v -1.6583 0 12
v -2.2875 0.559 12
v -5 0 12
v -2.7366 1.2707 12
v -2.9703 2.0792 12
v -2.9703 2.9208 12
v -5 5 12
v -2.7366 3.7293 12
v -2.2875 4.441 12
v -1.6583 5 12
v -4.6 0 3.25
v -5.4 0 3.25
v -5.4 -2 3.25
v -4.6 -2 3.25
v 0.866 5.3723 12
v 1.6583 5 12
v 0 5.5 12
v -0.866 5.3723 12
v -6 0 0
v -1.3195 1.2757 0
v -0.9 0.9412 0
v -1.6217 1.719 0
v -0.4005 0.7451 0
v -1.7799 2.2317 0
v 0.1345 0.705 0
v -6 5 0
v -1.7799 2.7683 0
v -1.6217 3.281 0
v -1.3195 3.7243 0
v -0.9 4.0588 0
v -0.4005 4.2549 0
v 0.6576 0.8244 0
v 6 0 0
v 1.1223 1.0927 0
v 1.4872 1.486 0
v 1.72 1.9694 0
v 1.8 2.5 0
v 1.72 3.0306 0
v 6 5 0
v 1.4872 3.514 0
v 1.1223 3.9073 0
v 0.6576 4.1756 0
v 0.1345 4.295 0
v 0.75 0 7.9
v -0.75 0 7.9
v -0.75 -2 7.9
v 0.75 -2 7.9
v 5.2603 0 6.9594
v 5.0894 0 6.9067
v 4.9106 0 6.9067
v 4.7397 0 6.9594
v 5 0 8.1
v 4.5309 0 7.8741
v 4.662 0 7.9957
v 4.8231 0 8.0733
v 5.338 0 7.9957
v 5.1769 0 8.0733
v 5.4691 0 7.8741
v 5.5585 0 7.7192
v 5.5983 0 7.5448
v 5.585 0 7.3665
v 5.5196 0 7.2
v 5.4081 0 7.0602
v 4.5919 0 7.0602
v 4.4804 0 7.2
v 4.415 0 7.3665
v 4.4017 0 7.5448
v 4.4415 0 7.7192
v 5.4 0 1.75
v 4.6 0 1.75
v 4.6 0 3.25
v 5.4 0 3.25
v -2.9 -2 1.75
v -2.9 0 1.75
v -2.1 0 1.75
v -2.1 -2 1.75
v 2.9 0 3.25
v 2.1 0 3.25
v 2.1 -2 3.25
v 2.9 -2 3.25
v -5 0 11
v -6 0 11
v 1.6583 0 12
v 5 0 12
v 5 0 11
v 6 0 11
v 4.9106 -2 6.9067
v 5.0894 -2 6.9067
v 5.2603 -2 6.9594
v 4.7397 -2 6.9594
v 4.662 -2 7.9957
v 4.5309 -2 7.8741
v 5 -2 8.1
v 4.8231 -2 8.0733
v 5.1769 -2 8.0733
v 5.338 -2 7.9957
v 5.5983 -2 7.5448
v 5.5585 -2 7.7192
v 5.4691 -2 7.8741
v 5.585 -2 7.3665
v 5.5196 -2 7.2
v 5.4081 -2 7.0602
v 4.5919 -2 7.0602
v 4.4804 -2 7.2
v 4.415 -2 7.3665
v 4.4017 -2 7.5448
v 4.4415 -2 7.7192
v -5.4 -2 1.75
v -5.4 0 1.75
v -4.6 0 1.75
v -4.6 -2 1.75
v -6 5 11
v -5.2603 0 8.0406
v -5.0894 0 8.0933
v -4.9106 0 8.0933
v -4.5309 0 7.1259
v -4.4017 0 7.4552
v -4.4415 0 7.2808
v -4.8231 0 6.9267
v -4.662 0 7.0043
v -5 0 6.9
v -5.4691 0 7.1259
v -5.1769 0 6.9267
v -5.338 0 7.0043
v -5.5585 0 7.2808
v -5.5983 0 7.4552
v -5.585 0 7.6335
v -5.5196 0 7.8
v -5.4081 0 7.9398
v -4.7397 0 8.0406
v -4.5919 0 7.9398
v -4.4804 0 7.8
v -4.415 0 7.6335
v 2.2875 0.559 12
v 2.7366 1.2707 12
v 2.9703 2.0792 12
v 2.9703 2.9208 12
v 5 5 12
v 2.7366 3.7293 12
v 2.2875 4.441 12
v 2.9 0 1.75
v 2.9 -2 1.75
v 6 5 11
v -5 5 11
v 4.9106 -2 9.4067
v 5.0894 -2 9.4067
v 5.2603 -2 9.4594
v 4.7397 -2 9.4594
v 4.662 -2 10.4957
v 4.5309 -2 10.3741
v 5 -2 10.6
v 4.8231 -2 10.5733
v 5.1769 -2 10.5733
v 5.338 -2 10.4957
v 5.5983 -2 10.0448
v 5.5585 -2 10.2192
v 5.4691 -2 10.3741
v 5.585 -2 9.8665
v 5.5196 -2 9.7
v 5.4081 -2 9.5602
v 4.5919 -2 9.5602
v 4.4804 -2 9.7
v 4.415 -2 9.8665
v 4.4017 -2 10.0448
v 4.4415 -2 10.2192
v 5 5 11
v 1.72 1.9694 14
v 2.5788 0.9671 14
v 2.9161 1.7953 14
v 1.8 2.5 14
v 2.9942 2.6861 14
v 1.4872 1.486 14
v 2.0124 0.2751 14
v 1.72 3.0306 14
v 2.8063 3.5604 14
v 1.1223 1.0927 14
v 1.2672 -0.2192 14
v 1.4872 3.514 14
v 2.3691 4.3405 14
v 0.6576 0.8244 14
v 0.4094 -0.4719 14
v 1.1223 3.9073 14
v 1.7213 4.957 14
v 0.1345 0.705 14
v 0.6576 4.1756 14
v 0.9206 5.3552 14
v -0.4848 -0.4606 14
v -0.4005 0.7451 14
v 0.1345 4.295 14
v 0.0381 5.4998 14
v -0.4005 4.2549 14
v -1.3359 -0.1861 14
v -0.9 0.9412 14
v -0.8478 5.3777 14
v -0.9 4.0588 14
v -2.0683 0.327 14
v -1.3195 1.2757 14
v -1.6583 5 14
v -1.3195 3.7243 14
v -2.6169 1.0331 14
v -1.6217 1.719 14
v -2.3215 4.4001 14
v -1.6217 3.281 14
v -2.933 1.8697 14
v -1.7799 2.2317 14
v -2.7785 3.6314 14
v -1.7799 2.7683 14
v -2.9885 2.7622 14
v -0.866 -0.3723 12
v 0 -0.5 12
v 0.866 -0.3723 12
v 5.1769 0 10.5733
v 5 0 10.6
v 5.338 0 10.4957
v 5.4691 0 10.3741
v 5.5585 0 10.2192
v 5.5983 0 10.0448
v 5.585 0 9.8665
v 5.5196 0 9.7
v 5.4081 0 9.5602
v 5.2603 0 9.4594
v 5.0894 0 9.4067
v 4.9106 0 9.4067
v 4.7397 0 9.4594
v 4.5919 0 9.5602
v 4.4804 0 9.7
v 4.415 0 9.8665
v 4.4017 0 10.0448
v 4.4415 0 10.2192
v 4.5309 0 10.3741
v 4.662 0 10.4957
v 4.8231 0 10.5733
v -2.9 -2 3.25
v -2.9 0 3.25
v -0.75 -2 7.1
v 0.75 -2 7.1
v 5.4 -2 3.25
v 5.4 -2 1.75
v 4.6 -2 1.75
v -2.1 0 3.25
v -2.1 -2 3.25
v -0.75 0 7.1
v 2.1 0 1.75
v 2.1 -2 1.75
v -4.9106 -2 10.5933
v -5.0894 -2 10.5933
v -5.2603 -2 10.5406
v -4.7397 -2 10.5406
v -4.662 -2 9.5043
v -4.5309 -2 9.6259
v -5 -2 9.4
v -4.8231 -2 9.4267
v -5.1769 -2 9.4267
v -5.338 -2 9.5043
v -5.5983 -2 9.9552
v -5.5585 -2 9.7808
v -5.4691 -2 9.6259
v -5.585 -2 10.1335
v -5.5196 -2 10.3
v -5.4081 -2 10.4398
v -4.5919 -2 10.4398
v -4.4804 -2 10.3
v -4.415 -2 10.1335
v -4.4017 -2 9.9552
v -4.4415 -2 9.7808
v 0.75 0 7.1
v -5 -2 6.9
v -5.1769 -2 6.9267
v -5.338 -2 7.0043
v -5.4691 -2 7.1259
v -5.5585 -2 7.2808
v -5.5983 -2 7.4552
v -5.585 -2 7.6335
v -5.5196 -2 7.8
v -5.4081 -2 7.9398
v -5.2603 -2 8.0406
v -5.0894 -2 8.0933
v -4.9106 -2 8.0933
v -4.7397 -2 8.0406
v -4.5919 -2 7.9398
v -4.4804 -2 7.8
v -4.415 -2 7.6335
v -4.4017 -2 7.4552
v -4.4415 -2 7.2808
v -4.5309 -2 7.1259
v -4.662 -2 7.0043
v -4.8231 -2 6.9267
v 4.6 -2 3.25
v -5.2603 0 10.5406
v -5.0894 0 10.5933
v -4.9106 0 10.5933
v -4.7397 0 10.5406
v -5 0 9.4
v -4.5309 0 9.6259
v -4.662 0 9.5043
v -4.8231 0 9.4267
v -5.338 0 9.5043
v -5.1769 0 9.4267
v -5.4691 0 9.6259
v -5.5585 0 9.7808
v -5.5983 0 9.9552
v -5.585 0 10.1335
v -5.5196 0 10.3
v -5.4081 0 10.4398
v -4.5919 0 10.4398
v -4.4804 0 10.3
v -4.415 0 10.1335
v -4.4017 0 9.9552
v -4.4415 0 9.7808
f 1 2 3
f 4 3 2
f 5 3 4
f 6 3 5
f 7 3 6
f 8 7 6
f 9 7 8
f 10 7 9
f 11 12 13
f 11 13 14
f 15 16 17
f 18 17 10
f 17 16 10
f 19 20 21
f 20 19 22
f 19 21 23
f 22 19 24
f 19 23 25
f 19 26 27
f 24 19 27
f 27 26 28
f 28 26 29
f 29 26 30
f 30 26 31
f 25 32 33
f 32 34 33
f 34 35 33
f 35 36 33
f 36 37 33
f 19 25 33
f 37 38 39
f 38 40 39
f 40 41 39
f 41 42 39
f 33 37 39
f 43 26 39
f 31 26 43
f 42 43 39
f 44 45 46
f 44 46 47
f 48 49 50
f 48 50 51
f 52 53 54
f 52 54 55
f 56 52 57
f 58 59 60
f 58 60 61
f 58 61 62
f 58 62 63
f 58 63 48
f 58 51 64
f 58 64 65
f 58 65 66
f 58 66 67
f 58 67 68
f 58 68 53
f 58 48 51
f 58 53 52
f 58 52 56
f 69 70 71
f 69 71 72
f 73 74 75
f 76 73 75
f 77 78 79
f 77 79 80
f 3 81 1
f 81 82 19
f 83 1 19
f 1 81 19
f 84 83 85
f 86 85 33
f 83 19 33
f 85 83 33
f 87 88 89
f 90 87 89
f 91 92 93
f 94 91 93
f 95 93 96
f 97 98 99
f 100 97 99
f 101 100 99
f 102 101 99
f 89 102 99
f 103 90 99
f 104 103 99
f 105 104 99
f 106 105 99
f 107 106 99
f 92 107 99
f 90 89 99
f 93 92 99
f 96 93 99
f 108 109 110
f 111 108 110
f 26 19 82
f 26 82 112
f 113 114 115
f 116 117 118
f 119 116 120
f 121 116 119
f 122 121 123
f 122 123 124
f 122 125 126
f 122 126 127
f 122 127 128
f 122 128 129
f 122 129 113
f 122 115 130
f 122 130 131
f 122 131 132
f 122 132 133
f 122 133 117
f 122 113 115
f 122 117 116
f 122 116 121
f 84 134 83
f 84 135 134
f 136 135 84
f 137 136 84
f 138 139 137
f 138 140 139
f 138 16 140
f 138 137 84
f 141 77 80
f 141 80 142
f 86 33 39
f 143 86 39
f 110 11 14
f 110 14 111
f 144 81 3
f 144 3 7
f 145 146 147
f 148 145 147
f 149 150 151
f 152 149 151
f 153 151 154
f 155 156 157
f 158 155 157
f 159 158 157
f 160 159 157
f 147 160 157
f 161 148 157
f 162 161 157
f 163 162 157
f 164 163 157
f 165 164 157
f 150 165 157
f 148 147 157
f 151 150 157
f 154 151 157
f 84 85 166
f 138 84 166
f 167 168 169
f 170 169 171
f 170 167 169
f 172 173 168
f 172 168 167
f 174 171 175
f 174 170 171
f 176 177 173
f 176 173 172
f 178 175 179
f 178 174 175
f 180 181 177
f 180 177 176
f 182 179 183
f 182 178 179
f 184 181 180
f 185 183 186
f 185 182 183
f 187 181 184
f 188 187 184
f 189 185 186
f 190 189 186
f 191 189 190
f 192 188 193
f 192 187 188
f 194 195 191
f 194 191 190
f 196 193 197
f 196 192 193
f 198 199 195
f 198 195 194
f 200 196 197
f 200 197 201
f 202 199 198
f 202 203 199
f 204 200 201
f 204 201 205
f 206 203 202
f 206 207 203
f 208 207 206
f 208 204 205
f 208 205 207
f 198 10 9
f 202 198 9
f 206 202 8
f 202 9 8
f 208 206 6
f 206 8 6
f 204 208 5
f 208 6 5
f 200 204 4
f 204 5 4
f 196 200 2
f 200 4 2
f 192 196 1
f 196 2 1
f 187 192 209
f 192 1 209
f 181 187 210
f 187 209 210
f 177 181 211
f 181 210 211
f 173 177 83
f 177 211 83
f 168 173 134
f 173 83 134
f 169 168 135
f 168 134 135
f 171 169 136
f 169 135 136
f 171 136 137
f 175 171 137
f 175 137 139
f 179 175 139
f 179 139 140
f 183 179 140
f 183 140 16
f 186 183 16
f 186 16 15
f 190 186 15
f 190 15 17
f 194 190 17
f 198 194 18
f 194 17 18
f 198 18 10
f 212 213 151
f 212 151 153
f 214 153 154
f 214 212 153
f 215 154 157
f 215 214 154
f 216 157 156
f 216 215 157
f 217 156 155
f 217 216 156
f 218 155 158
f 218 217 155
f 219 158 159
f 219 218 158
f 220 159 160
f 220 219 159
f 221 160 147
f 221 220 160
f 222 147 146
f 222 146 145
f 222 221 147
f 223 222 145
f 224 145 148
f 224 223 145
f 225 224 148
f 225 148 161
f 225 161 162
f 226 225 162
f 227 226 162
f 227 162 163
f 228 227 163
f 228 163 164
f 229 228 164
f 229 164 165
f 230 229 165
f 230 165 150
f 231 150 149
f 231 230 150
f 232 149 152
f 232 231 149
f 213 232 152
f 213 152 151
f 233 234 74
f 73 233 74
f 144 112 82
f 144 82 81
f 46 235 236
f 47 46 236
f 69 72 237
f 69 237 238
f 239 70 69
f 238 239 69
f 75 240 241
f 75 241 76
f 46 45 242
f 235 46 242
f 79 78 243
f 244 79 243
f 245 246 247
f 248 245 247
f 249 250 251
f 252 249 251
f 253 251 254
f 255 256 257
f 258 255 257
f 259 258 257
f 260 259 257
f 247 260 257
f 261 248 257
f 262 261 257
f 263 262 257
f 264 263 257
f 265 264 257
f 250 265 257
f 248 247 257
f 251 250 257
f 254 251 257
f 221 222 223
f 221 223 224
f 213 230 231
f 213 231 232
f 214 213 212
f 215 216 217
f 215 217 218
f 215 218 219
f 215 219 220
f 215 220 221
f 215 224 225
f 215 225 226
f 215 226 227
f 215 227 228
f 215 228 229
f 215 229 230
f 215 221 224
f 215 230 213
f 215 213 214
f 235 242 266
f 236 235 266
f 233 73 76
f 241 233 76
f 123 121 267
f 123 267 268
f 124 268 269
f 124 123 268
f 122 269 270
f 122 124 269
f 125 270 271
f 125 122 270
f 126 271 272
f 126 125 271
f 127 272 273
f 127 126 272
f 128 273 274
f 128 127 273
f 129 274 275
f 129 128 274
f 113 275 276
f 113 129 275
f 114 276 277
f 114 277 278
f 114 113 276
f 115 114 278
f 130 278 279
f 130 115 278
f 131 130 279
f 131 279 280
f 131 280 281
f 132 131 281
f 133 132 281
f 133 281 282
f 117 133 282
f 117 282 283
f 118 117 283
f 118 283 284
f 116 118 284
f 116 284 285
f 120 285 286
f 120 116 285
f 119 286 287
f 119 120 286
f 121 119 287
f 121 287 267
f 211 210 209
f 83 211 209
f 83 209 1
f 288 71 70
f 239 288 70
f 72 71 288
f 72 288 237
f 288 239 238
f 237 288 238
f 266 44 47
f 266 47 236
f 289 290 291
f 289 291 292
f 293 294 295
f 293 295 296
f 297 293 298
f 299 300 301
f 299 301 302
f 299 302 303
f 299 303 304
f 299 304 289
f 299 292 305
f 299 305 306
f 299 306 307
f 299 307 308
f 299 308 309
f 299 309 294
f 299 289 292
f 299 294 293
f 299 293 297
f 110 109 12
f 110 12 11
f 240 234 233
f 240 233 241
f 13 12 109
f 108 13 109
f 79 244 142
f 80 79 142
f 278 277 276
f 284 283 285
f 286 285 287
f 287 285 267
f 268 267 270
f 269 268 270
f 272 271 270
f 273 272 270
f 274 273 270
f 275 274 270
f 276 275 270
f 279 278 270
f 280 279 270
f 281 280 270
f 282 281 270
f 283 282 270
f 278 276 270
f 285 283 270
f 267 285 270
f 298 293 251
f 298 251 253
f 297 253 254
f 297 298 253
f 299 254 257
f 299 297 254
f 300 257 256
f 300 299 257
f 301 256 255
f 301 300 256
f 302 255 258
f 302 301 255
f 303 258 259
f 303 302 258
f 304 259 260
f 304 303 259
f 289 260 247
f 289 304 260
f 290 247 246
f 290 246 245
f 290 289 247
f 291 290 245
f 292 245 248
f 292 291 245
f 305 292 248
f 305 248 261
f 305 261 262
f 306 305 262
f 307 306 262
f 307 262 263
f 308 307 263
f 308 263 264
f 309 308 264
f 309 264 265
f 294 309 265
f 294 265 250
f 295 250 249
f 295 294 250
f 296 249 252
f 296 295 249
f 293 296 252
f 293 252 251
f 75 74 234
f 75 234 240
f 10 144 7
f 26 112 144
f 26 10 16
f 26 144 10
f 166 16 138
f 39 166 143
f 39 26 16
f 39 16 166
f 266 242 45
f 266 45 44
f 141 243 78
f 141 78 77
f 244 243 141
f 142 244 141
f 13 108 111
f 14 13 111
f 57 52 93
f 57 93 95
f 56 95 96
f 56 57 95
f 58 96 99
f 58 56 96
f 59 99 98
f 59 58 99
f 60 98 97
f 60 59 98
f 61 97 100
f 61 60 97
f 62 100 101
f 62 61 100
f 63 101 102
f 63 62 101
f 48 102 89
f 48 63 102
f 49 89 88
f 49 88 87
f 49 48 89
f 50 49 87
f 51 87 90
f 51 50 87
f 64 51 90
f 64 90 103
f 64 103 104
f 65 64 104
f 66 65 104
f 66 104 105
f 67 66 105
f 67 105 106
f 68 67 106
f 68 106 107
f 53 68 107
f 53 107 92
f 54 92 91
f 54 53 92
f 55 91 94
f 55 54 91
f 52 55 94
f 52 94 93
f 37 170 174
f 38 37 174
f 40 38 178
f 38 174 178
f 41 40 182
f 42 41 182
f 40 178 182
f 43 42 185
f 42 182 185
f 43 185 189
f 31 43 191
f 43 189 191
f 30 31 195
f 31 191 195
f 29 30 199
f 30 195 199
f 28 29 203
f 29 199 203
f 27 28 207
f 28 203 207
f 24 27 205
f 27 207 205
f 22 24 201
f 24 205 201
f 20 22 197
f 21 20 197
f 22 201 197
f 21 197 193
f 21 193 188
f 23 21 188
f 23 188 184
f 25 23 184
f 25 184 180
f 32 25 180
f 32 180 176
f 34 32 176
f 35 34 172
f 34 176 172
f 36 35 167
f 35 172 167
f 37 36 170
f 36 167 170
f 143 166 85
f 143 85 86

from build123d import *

# Parameters (mm, degrees)
SKETCH_1_W          = 12
SKETCH_1_H          = 5
EXTRUDE_1_DEPTH     = 11
SKETCH_2_R          = 0.6
EXTRUDE_2_DEPTH     = 2
EXTRUDE_2_2_DEPTH   = 2
EXTRUDE_2_3_DEPTH   = 2
EXTRUDE_2_4_DEPTH   = 2
SKETCH_2_W          = 0.8
SKETCH_2_H          = 1.5
EXTRUDE_2_5_DEPTH   = 2
EXTRUDE_2_6_DEPTH   = 2
SKETCH_2_W_2        = 1.5
SKETCH_2_H_2        = 0.8
EXTRUDE_2_7_DEPTH   = 2
EXTRUDE_2_8_DEPTH   = 2
EXTRUDE_2_9_DEPTH   = 2
SKETCH_3_W          = 10
SKETCH_3_H          = 5
EXTRUDE_3_DEPTH     = 1
SKETCH_4_R          = 3
EXTRUDE_4_DEPTH     = 2
SKETCH_5_R          = 1.8
CUT_EXTRUDE_1_DEPTH = 14


with BuildPart() as part:
    # Эскиз1 → Бобышка-Вытянуть1 (new body)
    with BuildSketch(Plane.XY):
        with Locations((0, 2.5)):
            Rectangle(SKETCH_1_W, SKETCH_1_H)
    extrude(amount=EXTRUDE_1_DEPTH)

    # Эскиз3 → Бобышка-Вытянуть3 (add)
    with BuildSketch(Plane.XY.offset(11)):
        with Locations((0, 2.5)):
            Rectangle(SKETCH_3_W, SKETCH_3_H)
    extrude(amount=EXTRUDE_3_DEPTH)

    # Эскиз4 → Бобышка-Вытянуть4 (add)
    with BuildSketch(Plane.XY.offset(12)):
        with Locations(Location((0, 2.5, 0), (0, 0, 123.557309762))):
            Circle(SKETCH_4_R)
    extrude(amount=EXTRUDE_4_DEPTH)

    # Эскиз5 → Вырез-Вытянуть1 (cut)
    with BuildSketch(Plane.XY.offset(14)):
        with Locations((0, 2.5)):
            Circle(SKETCH_5_R)
    extrude(amount=-CUT_EXTRUDE_1_DEPTH, mode=Mode.SUBTRACT)


with BuildPart() as body_2:
    # Эскиз2 → Бобышка-Вытянуть2 (new body)
    with BuildSketch(Plane(origin=(0, 0, 0), x_dir=(1, 0, 0), z_dir=(0, 1, 0))):
        with Locations(Location((5, -10, 0), (0, 0, 270))):
            Circle(SKETCH_2_R)
    extrude(amount=-EXTRUDE_2_DEPTH)


with BuildPart() as body_3:
    # Эскиз2 → Extrude 2 2 (new body)
    with BuildSketch(Plane(origin=(0, 0, 0), x_dir=(1, 0, 0), z_dir=(0, 1, 0))):
        with Locations(Location((5, -7.5, 0), (0, 0, 270))):
            Circle(SKETCH_2_R)
    extrude(amount=-EXTRUDE_2_2_DEPTH)


with BuildPart() as body_4:
    # Эскиз2 → Extrude 2 3 (new body)
    with BuildSketch(Plane(origin=(0, 0, 0), x_dir=(1, 0, 0), z_dir=(0, 1, 0))):
        with Locations(Location((-5, -10, 0), (0, 0, 90))):
            Circle(SKETCH_2_R)
    extrude(amount=-EXTRUDE_2_3_DEPTH)


with BuildPart() as body_5:
    # Эскиз2 → Extrude 2 4 (new body)
    with BuildSketch(Plane(origin=(0, 0, 0), x_dir=(1, 0, 0), z_dir=(0, 1, 0))):
        with Locations(Location((-5, -7.5, 0), (0, 0, 90))):
            Circle(SKETCH_2_R)
    extrude(amount=-EXTRUDE_2_4_DEPTH)


with BuildPart() as body_6:
    # Эскиз2 → Extrude 2 5 (new body)
    with BuildSketch(Plane(origin=(0, 0, 0), x_dir=(1, 0, 0), z_dir=(0, 1, 0))):
        with Locations((5, -2.5)):
            Rectangle(SKETCH_2_W, SKETCH_2_H)
    extrude(amount=-EXTRUDE_2_5_DEPTH)


with BuildPart() as body_7:
    # Эскиз2 → Extrude 2 6 (new body)
    with BuildSketch(Plane(origin=(0, 0, 0), x_dir=(1, 0, 0), z_dir=(0, 1, 0))):
        with Locations((2.5, -2.5)):
            Rectangle(SKETCH_2_W, SKETCH_2_H)
    extrude(amount=-EXTRUDE_2_6_DEPTH)


with BuildPart() as body_8:
    # Эскиз2 → Extrude 2 7 (new body)
    with BuildSketch(Plane(origin=(0, 0, 0), x_dir=(1, 0, 0), z_dir=(0, 1, 0))):
        with Locations((0, -7.5)):
            Rectangle(SKETCH_2_W_2, SKETCH_2_H_2)
    extrude(amount=-EXTRUDE_2_7_DEPTH)


with BuildPart() as body_9:
    # Эскиз2 → Extrude 2 8 (new body)
    with BuildSketch(Plane(origin=(0, 0, 0), x_dir=(1, 0, 0), z_dir=(0, 1, 0))):
        with Locations((-2.5, -2.5)):
            Rectangle(SKETCH_2_W, SKETCH_2_H)
    extrude(amount=-EXTRUDE_2_8_DEPTH)


with BuildPart() as body_10:
    # Эскиз2 → Extrude 2 9 (new body)
    with BuildSketch(Plane(origin=(0, 0, 0), x_dir=(1, 0, 0), z_dir=(0, 1, 0))):
        with Locations((-5, -2.5)):
            Rectangle(SKETCH_2_W, SKETCH_2_H)
    extrude(amount=-EXTRUDE_2_9_DEPTH)


solid = Compound([part.part, body_2.part, body_3.part, body_4.part, body_5.part, body_6.part, body_7.part, body_8.part, body_9.part, body_10.part])
